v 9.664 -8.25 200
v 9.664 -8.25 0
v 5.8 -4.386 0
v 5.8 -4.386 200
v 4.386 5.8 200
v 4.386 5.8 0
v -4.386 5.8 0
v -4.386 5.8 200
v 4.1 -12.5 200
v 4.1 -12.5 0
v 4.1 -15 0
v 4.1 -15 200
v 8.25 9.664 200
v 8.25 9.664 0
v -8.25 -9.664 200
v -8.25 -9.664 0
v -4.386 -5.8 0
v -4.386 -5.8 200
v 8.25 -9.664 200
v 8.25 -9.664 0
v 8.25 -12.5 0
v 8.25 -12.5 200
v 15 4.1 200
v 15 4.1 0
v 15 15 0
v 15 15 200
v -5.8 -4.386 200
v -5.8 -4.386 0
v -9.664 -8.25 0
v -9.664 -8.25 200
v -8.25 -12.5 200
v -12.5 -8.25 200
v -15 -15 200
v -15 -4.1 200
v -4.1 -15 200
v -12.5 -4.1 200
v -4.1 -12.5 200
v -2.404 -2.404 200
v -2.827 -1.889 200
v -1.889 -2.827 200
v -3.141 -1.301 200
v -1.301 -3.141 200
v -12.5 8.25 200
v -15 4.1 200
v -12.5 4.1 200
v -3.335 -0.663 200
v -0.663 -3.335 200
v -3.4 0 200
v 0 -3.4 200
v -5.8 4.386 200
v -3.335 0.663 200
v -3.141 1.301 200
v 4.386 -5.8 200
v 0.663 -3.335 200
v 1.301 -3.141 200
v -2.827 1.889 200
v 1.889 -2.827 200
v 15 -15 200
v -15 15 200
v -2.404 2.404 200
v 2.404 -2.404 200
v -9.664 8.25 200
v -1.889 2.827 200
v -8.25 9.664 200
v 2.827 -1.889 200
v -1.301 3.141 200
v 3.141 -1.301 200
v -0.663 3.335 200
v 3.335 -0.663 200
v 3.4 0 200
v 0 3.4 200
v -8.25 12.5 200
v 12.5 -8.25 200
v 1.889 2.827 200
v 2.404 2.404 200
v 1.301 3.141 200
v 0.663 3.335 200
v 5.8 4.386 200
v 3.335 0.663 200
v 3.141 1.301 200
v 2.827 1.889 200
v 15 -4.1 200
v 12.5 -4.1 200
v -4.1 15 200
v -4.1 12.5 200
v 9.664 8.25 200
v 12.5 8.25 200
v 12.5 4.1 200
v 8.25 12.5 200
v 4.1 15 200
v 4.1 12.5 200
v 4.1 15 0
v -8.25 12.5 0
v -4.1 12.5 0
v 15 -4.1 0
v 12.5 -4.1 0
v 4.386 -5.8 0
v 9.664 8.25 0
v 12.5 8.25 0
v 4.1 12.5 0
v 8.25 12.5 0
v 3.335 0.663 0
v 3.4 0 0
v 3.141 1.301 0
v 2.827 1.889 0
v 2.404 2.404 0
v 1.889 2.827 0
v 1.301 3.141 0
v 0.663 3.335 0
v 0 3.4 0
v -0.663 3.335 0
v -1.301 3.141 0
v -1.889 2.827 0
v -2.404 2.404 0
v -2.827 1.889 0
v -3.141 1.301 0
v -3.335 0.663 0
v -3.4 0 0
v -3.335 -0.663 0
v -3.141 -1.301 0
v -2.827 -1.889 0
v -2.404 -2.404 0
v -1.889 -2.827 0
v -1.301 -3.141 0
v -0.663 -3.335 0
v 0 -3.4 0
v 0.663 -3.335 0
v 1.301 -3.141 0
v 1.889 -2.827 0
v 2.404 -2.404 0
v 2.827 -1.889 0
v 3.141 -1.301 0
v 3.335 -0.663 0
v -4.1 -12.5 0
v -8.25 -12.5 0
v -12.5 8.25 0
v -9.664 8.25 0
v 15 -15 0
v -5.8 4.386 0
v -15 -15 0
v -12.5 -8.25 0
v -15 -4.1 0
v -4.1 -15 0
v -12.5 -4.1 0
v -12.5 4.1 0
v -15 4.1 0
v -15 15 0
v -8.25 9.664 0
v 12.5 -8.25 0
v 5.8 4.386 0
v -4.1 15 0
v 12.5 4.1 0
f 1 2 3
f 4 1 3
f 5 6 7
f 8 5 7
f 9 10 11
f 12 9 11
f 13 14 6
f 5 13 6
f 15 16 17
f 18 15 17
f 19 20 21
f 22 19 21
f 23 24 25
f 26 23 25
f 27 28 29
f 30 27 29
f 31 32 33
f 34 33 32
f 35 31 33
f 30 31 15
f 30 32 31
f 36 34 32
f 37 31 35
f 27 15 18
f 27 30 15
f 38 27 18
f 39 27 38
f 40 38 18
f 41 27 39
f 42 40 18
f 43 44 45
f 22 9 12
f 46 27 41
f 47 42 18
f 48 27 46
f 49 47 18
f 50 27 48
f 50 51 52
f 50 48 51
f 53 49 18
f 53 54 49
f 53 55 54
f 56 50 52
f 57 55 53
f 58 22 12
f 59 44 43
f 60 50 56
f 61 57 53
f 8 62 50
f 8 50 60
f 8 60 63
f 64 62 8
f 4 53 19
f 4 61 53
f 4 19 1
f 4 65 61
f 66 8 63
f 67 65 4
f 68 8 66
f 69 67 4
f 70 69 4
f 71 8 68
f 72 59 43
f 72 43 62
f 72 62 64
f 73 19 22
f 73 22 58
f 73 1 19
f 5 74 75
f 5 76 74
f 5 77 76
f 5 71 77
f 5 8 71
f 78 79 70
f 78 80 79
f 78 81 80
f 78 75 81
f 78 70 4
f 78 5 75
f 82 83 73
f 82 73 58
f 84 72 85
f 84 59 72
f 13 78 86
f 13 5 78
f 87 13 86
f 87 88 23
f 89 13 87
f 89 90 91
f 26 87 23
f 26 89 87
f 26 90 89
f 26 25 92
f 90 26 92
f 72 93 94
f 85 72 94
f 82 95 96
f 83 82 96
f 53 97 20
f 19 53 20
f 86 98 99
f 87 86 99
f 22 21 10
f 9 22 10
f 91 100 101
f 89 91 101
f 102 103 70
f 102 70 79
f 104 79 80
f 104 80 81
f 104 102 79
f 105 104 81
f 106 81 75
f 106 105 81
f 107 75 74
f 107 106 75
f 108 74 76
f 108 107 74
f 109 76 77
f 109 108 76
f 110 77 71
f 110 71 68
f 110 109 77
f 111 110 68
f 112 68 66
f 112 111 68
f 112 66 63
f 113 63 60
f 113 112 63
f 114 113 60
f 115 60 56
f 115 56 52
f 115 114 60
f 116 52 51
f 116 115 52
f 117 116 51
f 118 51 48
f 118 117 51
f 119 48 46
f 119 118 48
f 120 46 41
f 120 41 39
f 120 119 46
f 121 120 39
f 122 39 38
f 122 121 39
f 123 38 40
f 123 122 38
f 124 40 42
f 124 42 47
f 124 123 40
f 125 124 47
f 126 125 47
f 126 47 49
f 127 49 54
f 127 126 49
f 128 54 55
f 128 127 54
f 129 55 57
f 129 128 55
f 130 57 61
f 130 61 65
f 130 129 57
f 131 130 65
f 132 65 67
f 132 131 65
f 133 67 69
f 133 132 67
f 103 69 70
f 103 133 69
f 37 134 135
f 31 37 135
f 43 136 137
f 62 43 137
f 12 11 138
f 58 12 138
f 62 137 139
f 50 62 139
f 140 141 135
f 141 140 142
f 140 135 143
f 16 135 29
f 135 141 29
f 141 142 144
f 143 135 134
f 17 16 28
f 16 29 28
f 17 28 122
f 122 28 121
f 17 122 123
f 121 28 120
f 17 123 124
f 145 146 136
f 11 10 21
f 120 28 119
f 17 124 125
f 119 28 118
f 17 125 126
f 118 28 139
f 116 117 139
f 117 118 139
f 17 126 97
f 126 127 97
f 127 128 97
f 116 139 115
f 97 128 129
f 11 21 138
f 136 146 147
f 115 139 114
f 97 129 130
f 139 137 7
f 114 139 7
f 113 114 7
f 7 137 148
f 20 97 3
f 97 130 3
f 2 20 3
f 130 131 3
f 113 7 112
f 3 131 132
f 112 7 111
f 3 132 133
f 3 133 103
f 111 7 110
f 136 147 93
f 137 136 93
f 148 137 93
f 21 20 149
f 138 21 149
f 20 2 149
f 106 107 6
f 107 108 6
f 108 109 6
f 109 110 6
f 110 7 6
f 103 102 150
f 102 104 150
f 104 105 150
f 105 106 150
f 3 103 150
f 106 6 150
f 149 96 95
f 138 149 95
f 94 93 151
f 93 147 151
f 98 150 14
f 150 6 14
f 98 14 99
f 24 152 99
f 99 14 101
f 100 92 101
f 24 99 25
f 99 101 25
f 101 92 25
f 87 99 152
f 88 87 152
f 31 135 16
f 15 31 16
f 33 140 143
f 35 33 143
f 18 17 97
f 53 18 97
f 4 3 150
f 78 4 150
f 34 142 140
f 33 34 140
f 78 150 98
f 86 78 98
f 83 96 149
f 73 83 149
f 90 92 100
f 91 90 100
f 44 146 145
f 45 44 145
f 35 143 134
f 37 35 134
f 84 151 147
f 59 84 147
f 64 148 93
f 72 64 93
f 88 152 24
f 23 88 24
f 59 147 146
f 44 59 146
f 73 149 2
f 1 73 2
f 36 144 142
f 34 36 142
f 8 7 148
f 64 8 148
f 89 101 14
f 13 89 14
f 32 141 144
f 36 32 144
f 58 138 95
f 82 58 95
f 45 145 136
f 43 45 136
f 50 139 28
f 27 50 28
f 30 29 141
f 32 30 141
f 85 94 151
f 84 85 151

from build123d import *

# Parameters (mm, degrees)
SKETCH_1_R      = 3.4
EXTRUDE_1_DEPTH = 200


with BuildPart() as part:
    # 草图1 → 凸台-拉伸1 (new body)
    with BuildSketch(Plane.XY):
        Polygon((-4.1, 12.5), (-4.1, 15), (-8.25, 15), (-15, 15), (-15, 8.25), (-15, 4.1), (-12.5, 4.1), (-12.5, 8.25), (-9.664213562, 8.25), (-5.8, 4.385786438), (-5.8, -4.385786438), (-9.664213562, -8.25), (-12.5, -8.25), (-12.5, -4.1), (-15, -4.1), (-15, -8.25), (-15, -15), (-8.25, -15), (-4.1, -15), (-4.1, -12.5), (-8.25, -12.5), (-8.25, -9.664213562), (-4.385786438, -5.8), (4.385786438, -5.8), (8.25, -9.664213562), (8.25, -12.5), (4.1, -12.5), (4.1, -15), (8.25, -15), (15, -15), (15, -8.25), (15, -4.1), (12.5, -4.1), (12.5, -8.25), (9.664213562, -8.25), (5.8, -4.385786438), (5.8, 4.385786438), (9.664213562, 8.25), (12.5, 8.25), (12.5, 4.1), (15, 4.1), (15, 8.25), (15, 15), (8.25, 15), (4.1, 15), (4.1, 12.5), (8.25, 12.5), (8.25, 9.664213562), (4.385786438, 5.8), (-4.385786438, 5.8), (-8.25, 9.664213562), (-8.25, 12.5), align=None)
        Circle(SKETCH_1_R, mode=Mode.SUBTRACT)
    extrude(amount=EXTRUDE_1_DEPTH)


solid = part.part
